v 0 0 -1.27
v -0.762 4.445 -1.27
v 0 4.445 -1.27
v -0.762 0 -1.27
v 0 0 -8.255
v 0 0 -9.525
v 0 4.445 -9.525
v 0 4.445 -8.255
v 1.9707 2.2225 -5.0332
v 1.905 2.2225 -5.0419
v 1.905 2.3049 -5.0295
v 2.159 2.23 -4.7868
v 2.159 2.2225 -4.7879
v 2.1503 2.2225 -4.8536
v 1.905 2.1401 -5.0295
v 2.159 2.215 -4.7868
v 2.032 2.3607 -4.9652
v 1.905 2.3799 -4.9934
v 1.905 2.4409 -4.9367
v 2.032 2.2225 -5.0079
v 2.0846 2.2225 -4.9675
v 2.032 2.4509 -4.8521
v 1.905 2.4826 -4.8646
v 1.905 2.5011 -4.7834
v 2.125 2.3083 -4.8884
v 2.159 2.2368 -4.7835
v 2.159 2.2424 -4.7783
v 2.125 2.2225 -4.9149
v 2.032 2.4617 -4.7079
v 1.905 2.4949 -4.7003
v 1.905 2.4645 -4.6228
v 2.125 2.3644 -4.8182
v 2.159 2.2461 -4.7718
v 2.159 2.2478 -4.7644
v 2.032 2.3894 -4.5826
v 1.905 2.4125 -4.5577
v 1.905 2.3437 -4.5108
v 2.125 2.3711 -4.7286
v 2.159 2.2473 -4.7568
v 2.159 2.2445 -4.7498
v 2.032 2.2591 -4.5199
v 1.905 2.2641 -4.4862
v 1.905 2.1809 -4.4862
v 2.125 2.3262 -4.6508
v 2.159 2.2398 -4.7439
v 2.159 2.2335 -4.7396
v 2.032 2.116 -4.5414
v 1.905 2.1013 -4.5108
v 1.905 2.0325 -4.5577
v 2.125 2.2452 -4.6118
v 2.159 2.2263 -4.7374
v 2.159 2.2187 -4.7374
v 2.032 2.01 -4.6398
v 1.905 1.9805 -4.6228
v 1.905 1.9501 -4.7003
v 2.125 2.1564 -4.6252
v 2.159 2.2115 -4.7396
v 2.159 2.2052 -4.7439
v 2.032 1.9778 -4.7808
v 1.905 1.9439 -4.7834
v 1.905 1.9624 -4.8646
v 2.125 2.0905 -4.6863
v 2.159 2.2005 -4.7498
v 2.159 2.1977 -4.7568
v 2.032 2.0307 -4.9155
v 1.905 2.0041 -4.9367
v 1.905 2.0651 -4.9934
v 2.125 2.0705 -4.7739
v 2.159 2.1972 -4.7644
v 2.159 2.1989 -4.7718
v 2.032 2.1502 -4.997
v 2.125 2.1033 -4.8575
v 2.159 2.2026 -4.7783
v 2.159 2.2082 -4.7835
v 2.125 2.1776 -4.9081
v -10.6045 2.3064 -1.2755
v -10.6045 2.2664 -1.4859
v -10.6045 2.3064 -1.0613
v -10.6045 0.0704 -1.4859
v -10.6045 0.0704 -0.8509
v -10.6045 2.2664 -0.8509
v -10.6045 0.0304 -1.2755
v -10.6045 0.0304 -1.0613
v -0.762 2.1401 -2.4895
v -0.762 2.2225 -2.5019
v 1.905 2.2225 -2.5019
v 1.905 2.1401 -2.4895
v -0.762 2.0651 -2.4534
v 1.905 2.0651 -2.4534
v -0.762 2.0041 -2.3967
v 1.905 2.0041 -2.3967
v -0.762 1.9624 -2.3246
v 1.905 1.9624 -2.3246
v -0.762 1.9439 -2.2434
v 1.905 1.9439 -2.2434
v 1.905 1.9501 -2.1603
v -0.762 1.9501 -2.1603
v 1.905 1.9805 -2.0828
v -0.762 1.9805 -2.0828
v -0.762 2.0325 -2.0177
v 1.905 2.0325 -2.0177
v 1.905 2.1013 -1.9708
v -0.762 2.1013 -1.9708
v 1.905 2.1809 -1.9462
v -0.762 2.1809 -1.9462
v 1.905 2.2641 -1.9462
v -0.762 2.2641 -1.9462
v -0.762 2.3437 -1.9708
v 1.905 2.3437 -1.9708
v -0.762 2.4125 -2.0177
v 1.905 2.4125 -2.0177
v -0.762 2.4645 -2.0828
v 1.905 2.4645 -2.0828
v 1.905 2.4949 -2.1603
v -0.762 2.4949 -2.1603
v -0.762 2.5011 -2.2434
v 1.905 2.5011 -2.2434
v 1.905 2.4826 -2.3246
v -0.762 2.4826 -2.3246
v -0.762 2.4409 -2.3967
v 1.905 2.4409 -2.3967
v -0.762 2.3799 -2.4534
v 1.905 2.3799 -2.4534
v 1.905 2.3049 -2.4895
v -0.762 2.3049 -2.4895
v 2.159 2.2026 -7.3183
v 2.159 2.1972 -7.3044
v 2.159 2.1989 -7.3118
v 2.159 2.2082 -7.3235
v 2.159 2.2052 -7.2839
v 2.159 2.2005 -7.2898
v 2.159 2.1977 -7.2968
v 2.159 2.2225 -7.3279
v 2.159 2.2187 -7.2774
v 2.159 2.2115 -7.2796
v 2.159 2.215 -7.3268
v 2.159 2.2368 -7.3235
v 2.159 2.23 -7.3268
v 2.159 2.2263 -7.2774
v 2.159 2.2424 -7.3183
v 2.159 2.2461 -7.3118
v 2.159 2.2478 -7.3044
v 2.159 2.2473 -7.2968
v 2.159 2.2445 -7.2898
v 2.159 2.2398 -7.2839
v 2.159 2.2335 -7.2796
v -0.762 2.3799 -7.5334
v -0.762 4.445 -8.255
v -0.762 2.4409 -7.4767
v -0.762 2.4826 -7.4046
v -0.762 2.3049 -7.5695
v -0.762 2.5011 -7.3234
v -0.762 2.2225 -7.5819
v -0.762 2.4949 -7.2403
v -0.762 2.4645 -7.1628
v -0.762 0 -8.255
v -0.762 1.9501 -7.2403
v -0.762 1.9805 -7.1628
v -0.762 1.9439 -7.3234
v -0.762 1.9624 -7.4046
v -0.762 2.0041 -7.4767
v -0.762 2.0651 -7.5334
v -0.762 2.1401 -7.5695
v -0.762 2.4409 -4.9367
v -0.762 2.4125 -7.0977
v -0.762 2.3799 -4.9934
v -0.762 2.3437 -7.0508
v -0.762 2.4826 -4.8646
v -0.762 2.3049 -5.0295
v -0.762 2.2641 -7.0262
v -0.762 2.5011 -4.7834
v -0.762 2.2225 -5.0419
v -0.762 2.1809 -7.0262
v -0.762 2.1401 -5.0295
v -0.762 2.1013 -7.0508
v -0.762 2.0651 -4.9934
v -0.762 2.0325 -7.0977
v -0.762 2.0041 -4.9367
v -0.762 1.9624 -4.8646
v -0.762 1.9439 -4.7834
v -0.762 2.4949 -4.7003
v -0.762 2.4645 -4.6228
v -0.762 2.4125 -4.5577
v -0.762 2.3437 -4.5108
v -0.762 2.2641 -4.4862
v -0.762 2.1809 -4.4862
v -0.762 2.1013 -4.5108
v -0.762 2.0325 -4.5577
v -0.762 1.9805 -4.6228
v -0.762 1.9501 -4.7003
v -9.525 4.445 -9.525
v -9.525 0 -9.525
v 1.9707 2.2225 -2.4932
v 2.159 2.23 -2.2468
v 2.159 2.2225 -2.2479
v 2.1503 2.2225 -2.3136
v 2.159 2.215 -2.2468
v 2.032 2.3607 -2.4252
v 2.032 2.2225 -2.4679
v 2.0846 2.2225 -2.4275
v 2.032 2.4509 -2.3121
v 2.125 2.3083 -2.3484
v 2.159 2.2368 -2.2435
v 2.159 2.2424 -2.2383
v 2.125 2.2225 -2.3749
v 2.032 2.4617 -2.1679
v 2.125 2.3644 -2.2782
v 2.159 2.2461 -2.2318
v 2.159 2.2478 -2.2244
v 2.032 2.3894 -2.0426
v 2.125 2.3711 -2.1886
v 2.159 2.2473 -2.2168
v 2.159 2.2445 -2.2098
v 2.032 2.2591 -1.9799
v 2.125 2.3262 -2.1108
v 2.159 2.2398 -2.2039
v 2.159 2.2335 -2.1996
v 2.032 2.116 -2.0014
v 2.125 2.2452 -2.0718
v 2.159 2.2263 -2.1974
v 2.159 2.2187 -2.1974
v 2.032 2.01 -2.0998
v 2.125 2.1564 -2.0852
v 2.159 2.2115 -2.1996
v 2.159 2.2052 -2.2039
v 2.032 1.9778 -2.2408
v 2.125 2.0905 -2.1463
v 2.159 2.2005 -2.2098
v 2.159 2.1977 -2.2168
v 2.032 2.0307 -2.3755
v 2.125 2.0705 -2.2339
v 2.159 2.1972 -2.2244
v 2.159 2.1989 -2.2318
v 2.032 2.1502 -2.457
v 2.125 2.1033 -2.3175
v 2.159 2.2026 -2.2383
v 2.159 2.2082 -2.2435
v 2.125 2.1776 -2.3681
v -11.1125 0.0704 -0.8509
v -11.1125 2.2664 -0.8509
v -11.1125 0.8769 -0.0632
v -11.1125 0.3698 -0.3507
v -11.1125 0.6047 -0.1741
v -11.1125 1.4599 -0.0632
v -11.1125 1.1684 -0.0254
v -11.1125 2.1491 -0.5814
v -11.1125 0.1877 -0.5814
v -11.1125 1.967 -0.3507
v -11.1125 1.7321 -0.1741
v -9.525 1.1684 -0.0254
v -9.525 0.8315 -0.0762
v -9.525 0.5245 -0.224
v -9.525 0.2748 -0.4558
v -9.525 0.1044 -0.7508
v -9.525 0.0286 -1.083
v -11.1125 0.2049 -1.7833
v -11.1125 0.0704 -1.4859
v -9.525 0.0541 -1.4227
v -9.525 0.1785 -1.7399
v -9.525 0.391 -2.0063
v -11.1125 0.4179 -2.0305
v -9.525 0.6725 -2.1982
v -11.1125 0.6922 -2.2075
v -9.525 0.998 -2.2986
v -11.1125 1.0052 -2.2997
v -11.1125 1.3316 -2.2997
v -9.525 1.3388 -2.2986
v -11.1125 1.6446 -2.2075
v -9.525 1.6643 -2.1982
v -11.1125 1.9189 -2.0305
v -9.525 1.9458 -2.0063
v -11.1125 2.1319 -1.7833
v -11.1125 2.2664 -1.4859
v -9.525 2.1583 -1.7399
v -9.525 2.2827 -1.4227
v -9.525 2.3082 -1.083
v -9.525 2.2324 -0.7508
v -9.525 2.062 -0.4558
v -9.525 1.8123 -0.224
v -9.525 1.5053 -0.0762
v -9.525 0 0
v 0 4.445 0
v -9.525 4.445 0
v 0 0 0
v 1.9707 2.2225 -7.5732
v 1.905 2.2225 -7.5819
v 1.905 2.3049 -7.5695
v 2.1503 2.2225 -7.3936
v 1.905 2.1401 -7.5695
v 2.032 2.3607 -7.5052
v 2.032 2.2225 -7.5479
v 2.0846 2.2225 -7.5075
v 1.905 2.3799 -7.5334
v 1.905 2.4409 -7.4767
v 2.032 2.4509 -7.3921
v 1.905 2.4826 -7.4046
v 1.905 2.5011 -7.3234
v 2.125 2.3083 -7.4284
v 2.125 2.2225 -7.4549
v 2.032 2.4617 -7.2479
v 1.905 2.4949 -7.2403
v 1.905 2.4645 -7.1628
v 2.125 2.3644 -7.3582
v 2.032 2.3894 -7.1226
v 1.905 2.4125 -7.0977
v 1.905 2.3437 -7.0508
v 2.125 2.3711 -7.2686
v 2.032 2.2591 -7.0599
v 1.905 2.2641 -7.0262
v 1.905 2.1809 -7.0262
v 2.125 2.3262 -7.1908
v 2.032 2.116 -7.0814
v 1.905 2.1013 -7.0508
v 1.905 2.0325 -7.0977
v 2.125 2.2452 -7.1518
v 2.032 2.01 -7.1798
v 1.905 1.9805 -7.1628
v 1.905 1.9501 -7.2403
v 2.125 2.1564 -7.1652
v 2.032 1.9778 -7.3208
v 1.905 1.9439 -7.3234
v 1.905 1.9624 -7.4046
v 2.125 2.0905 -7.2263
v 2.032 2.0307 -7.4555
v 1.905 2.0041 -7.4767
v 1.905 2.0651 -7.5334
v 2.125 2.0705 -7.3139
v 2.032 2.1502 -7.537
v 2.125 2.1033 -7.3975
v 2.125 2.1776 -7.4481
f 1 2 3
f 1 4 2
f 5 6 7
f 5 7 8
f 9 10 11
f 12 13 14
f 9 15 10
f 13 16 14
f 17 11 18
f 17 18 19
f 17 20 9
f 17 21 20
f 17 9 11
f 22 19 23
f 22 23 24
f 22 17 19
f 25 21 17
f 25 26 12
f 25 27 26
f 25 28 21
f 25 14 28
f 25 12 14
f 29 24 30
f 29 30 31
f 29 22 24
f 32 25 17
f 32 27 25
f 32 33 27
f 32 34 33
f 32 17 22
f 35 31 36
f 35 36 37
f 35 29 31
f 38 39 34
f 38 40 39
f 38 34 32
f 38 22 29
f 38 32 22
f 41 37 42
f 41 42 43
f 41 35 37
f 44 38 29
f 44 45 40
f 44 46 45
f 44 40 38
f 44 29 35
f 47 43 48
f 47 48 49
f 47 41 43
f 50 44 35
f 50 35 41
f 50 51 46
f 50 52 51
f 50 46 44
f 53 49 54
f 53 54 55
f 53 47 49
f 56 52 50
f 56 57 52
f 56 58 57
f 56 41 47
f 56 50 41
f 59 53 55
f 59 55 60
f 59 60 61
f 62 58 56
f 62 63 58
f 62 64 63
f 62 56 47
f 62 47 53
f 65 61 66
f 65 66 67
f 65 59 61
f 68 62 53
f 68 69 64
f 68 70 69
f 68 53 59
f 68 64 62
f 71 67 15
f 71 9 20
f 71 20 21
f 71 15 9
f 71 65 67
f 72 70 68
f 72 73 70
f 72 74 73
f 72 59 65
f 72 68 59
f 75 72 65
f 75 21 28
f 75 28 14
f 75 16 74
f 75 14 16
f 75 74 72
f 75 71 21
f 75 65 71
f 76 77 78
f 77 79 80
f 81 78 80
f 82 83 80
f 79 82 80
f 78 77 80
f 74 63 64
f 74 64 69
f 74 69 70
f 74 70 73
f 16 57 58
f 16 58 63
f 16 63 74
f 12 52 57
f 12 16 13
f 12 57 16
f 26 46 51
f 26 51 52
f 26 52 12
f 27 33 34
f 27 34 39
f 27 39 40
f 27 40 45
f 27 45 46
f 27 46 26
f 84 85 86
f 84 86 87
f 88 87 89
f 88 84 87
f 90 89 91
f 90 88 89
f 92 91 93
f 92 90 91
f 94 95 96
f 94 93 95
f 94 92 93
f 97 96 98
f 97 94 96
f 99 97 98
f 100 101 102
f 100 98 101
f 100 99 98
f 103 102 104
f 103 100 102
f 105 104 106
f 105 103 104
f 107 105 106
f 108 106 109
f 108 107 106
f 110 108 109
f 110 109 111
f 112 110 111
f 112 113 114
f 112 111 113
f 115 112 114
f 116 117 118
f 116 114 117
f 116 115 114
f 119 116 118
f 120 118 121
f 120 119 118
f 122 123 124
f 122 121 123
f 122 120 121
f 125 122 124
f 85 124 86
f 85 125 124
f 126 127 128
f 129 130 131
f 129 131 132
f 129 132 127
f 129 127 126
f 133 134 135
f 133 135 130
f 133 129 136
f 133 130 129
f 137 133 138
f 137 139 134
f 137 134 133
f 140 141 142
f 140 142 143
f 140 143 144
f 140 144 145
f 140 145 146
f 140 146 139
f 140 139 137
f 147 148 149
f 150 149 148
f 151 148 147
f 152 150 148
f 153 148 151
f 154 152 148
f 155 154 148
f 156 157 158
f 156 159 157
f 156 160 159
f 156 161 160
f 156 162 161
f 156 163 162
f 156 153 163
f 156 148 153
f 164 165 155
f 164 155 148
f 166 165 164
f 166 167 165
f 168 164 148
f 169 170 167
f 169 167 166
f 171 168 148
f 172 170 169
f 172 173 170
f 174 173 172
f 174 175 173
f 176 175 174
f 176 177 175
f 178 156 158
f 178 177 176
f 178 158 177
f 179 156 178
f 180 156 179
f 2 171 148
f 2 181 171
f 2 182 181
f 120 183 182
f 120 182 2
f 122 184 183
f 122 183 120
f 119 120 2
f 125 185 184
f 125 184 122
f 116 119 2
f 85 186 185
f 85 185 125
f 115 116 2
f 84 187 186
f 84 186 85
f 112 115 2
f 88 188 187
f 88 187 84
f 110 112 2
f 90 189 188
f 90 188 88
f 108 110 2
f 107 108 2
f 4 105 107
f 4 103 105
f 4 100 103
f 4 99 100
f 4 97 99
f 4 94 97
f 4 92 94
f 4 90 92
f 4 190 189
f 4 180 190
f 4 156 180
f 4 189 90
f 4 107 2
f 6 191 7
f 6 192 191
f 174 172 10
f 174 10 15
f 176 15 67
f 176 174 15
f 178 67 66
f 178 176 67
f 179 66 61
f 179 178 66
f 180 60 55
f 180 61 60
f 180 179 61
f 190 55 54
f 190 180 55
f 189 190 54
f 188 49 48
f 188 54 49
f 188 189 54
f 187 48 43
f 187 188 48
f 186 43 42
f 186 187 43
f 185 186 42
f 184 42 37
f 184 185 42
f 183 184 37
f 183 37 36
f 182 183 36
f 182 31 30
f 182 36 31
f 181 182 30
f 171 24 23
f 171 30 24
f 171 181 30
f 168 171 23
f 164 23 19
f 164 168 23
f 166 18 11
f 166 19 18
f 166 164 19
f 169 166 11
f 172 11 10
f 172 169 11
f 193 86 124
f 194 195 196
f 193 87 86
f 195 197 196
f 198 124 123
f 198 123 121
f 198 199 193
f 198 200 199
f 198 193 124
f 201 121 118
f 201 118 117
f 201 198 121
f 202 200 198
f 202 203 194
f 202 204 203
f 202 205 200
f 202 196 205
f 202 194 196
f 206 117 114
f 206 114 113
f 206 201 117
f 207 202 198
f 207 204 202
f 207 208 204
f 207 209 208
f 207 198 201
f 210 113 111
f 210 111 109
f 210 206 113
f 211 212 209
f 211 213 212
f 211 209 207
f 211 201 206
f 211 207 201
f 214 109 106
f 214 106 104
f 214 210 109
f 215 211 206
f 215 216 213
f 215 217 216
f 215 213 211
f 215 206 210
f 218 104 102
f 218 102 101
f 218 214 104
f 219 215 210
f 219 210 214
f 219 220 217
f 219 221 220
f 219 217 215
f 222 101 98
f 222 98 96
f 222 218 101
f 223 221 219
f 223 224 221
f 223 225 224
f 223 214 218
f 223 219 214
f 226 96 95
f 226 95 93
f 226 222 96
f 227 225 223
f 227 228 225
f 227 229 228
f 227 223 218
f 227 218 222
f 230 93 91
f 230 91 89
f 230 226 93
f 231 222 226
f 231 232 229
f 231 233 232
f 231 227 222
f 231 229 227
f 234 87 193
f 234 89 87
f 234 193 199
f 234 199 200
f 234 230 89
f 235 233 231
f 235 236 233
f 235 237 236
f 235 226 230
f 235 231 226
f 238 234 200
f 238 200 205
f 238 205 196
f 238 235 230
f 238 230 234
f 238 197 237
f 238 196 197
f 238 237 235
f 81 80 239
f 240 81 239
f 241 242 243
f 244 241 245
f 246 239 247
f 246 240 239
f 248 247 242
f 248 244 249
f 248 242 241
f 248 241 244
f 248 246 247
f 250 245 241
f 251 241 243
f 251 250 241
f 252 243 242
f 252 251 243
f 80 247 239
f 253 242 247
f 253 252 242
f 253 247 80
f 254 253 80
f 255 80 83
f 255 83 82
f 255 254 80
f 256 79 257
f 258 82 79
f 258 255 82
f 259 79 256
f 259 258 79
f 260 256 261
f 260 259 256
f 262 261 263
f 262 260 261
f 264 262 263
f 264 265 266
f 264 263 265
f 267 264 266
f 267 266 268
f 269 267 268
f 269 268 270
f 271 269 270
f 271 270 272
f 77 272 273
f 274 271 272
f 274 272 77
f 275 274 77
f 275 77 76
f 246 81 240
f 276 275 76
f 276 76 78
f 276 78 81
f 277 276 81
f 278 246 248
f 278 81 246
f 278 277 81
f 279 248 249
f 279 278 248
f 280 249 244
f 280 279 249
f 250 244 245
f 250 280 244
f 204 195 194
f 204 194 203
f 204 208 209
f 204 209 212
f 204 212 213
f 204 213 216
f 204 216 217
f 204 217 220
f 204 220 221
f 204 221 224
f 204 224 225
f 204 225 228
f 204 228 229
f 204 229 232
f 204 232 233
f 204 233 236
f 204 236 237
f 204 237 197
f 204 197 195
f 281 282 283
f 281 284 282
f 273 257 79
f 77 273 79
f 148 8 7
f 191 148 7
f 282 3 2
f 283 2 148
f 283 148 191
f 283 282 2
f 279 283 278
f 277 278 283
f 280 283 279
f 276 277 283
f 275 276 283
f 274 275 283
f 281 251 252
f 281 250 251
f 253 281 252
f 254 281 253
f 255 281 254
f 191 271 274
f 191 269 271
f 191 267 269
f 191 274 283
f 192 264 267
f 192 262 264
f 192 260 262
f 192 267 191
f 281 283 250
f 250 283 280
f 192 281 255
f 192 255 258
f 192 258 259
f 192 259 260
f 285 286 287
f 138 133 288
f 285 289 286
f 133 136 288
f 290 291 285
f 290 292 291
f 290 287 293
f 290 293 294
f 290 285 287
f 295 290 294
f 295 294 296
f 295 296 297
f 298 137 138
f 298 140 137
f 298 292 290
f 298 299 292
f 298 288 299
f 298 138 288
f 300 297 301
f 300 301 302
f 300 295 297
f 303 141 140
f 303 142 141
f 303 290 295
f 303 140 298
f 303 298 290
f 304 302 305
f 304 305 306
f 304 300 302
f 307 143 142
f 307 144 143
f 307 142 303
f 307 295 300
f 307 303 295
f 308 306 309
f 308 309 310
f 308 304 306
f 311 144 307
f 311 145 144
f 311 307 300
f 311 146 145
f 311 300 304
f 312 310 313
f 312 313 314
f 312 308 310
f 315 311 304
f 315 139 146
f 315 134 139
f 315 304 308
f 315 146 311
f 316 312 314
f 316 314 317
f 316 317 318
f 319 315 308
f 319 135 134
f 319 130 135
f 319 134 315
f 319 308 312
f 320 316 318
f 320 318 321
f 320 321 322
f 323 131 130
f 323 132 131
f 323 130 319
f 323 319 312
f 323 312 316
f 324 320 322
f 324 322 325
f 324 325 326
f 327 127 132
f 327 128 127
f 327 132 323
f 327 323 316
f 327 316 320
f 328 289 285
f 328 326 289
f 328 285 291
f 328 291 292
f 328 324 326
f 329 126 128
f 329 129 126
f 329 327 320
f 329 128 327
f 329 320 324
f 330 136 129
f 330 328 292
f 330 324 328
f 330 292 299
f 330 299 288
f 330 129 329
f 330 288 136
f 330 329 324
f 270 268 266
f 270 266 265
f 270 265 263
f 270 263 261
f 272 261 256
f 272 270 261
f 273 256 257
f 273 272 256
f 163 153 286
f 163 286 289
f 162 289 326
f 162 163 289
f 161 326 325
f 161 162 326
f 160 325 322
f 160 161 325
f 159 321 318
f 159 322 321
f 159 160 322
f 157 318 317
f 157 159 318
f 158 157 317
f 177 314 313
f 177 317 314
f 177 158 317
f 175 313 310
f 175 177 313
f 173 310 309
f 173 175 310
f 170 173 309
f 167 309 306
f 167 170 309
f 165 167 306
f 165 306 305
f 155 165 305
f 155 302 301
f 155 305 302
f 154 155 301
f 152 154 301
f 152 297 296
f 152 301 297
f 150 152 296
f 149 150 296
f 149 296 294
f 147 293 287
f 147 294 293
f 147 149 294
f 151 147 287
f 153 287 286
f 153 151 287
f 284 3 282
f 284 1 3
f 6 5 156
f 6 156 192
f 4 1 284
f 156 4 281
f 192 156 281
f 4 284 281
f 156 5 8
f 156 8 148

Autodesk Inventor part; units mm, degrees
ref_plane "YZ Plane" through (0, 0, 0) normal (1, 0, 0) x (0, 1, 0)
ref_plane "XZ Plane" through (0, 0, 0) normal (0, 1, 0) x (-1, 0, 0)
ref_plane "XY Plane" through (0, 0, 0) normal (0, 0, 1) x (1, 0, 0)
sketch "Sketch1" plane through (0, 0, 0) normal (0, 1, 0) x (-1, 0, 0)
  line L0 (0, 0) -> (9.525, 0)
  line L1 (9.525, 0) -> (9.525, -9.525)
  line L2 (9.525, -9.525) -> (0, -9.525)
  line L3 (0, -9.525) -> (0, -8.255)
  line L4 (0, -8.255) -> (0.762, -8.255)
  line L5 (0.762, -8.255) -> (0.762, -1.27)
  line L6 (0.762, -1.27) -> (0, -1.27)
  line L7 (0, -1.27) -> (0, 0)
  dimension "d0" = 9.525
  dimension "d1" = 9.525
  dimension "d2" = 6.985
  dimension "d3" = 0.762
extrude "Extrusion1" add sketch "Sketch1" along normal blind 4.445
sketch "Sketch2" plane through (-0.762, 0, -1.27) normal (1, 0, 0) x (0, 0, -1)
  circle A0 centre (3.4925, 2.2225) radius 0.2794
  circle A1 centre (0.9525, 2.2225) radius 0.2794
  circle A2 centre (6.0325, 2.2225) radius 0.2794
  line L0 (0, 4.445) -> (6.985, 4.445) construction
  line L1 (0, 0) -> (0, 4.445) construction
  point P0 (-1.27, 0)
  point P1 (3.4925, 4.445)
  point P2 (0, 2.2225)
  dimension "d6" = 0.5588
  dimension "d7" = 2.54
  dimension "d8" = 2.54
extrude "Extrusion2" add sketch "Sketch2" along normal blind 2.921
sketch "Sketch3" plane through (-9.525, 0, -9.525) normal (-1, 0, 0) x (0, 0, 1)
  circle A0 centre (8.3566, 1.1684) radius 1.143
  line L0 (9.525, 0) -> (0, 0) projected
  line L1 (9.525, 0) -> (9.525, 4.445) projected
  dimension "d11" = 2.286
  dimension "d12" = 1.1684
  dimension "d13" = 1.1684
extrude "Extrusion3" add sketch "Sketch3" along normal blind 1.5875
sketch "Sketch4" plane through (0, 0, 0) normal (0, -1, 0) x (1, 0, 0)
  line L0 (-11.1125, -1.4859) -> (-10.6045, -1.4859)
  line L1 (-10.6045, -1.4859) -> (-10.6045, -0.8509)
  line L2 (-10.6045, -0.8509) -> (-11.1125, -0.8509)
  line L3 (-11.1125, -0.8509) -> (-11.1125, -1.4859)
  line L4 (-11.1125, -0.0254) -> (-11.1125, -2.3114) projected
  point P0 (0, 0)
  point P1 (-11.1125, -1.1684)
  dimension "d16" = 0.508
  dimension "d17" = 0.635
extrude "Extrusion4" cut sketch "Sketch4" against normal through all
fillet "Fillet1" radius 0.254 3 edges at (2.159, 2.2225, -7.0231) (2.159, 2.2225, -4.4831) (2.159, 2.2225, -1.9431)
equation "\"d8\" = d7"
equation "\"d13\" = d12"
properties part number "Precision Trim Pot - baoter 3296"
